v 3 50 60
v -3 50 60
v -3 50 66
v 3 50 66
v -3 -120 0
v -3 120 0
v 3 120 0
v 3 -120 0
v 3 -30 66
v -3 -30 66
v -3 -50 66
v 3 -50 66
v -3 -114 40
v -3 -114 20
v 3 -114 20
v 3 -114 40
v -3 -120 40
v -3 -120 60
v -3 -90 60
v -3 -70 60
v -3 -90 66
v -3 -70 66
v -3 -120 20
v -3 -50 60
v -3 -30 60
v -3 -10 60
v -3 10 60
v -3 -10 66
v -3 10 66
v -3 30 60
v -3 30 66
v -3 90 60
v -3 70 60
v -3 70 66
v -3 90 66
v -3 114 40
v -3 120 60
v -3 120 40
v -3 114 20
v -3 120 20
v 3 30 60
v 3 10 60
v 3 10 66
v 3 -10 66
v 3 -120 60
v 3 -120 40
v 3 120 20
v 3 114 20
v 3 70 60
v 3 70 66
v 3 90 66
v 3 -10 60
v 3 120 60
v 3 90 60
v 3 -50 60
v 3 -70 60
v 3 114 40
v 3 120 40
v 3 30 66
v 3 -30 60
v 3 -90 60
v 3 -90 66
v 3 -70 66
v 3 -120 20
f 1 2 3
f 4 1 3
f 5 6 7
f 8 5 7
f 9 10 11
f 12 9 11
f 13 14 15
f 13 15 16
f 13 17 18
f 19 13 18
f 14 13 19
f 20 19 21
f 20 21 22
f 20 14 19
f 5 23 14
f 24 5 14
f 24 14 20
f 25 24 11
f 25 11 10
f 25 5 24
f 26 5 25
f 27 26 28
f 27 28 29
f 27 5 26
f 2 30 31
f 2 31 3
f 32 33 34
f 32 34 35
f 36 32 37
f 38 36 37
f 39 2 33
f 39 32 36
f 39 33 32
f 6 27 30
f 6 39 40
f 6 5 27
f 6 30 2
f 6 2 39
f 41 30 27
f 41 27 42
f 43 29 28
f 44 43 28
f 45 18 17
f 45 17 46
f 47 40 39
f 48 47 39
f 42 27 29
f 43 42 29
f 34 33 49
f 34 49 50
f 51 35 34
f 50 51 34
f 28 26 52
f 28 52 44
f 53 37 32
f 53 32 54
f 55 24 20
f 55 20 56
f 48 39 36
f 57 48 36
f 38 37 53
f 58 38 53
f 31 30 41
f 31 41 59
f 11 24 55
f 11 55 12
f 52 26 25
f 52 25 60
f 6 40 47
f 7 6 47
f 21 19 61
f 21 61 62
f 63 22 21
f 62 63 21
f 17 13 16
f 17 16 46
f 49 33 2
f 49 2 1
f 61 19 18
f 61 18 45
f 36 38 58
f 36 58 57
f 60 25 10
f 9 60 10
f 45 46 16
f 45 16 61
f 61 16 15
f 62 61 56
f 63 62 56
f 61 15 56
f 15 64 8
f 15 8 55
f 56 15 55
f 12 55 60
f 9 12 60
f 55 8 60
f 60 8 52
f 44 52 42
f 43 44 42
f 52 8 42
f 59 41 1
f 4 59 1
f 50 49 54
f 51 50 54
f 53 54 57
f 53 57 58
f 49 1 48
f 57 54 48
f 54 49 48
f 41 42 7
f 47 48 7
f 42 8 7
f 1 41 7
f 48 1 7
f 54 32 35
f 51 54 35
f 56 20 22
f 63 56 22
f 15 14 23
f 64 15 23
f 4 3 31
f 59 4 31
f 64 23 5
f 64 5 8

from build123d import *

# Parameters (mm, degrees)
F0_W     = 6
F0_H     = 240
F1_DEPTH = 60
F2_W     = 6
F2_H     = 20
F3_DEPTH = 6.001
F2_W_2   = 20
F2_H_2   = 6
F4_DEPTH = 6


with BuildPart() as f1:
    # F0 (on Top) → F1 (new body)
    with BuildSketch(Plane.XY):
        Rectangle(F0_W, F0_H)
    extrude(amount=F1_DEPTH)

    # F2 (on face) → F3 (cut, through all)
    with BuildSketch(Plane(origin=(-3, 0, 0), x_dir=(0, -1, 0), z_dir=(-1, 0, 0))):
        with Locations((-117, 30)):
            Rectangle(F2_W, F2_H)
        with Locations((117, 30)):
            Rectangle(F2_W, F2_H)
    extrude(amount=-F3_DEPTH, mode=Mode.SUBTRACT)

    # F2 (on face) → F4 (join)
    with BuildSketch(Plane(origin=(-3, 0, 0), x_dir=(0, -1, 0), z_dir=(-1, 0, 0))):
        with Locations((80, 63)):
            Rectangle(F2_W_2, F2_H_2)
        with Locations((40, 63)):
            Rectangle(F2_W_2, F2_H_2)
        with Locations((0, 63)):
            Rectangle(F2_W_2, F2_H_2)
        with Locations((-40, 63)):
            Rectangle(F2_W_2, F2_H_2)
        with Locations((-80, 63)):
            Rectangle(F2_W_2, F2_H_2)
    extrude(amount=-F4_DEPTH)


solid = f1.part
